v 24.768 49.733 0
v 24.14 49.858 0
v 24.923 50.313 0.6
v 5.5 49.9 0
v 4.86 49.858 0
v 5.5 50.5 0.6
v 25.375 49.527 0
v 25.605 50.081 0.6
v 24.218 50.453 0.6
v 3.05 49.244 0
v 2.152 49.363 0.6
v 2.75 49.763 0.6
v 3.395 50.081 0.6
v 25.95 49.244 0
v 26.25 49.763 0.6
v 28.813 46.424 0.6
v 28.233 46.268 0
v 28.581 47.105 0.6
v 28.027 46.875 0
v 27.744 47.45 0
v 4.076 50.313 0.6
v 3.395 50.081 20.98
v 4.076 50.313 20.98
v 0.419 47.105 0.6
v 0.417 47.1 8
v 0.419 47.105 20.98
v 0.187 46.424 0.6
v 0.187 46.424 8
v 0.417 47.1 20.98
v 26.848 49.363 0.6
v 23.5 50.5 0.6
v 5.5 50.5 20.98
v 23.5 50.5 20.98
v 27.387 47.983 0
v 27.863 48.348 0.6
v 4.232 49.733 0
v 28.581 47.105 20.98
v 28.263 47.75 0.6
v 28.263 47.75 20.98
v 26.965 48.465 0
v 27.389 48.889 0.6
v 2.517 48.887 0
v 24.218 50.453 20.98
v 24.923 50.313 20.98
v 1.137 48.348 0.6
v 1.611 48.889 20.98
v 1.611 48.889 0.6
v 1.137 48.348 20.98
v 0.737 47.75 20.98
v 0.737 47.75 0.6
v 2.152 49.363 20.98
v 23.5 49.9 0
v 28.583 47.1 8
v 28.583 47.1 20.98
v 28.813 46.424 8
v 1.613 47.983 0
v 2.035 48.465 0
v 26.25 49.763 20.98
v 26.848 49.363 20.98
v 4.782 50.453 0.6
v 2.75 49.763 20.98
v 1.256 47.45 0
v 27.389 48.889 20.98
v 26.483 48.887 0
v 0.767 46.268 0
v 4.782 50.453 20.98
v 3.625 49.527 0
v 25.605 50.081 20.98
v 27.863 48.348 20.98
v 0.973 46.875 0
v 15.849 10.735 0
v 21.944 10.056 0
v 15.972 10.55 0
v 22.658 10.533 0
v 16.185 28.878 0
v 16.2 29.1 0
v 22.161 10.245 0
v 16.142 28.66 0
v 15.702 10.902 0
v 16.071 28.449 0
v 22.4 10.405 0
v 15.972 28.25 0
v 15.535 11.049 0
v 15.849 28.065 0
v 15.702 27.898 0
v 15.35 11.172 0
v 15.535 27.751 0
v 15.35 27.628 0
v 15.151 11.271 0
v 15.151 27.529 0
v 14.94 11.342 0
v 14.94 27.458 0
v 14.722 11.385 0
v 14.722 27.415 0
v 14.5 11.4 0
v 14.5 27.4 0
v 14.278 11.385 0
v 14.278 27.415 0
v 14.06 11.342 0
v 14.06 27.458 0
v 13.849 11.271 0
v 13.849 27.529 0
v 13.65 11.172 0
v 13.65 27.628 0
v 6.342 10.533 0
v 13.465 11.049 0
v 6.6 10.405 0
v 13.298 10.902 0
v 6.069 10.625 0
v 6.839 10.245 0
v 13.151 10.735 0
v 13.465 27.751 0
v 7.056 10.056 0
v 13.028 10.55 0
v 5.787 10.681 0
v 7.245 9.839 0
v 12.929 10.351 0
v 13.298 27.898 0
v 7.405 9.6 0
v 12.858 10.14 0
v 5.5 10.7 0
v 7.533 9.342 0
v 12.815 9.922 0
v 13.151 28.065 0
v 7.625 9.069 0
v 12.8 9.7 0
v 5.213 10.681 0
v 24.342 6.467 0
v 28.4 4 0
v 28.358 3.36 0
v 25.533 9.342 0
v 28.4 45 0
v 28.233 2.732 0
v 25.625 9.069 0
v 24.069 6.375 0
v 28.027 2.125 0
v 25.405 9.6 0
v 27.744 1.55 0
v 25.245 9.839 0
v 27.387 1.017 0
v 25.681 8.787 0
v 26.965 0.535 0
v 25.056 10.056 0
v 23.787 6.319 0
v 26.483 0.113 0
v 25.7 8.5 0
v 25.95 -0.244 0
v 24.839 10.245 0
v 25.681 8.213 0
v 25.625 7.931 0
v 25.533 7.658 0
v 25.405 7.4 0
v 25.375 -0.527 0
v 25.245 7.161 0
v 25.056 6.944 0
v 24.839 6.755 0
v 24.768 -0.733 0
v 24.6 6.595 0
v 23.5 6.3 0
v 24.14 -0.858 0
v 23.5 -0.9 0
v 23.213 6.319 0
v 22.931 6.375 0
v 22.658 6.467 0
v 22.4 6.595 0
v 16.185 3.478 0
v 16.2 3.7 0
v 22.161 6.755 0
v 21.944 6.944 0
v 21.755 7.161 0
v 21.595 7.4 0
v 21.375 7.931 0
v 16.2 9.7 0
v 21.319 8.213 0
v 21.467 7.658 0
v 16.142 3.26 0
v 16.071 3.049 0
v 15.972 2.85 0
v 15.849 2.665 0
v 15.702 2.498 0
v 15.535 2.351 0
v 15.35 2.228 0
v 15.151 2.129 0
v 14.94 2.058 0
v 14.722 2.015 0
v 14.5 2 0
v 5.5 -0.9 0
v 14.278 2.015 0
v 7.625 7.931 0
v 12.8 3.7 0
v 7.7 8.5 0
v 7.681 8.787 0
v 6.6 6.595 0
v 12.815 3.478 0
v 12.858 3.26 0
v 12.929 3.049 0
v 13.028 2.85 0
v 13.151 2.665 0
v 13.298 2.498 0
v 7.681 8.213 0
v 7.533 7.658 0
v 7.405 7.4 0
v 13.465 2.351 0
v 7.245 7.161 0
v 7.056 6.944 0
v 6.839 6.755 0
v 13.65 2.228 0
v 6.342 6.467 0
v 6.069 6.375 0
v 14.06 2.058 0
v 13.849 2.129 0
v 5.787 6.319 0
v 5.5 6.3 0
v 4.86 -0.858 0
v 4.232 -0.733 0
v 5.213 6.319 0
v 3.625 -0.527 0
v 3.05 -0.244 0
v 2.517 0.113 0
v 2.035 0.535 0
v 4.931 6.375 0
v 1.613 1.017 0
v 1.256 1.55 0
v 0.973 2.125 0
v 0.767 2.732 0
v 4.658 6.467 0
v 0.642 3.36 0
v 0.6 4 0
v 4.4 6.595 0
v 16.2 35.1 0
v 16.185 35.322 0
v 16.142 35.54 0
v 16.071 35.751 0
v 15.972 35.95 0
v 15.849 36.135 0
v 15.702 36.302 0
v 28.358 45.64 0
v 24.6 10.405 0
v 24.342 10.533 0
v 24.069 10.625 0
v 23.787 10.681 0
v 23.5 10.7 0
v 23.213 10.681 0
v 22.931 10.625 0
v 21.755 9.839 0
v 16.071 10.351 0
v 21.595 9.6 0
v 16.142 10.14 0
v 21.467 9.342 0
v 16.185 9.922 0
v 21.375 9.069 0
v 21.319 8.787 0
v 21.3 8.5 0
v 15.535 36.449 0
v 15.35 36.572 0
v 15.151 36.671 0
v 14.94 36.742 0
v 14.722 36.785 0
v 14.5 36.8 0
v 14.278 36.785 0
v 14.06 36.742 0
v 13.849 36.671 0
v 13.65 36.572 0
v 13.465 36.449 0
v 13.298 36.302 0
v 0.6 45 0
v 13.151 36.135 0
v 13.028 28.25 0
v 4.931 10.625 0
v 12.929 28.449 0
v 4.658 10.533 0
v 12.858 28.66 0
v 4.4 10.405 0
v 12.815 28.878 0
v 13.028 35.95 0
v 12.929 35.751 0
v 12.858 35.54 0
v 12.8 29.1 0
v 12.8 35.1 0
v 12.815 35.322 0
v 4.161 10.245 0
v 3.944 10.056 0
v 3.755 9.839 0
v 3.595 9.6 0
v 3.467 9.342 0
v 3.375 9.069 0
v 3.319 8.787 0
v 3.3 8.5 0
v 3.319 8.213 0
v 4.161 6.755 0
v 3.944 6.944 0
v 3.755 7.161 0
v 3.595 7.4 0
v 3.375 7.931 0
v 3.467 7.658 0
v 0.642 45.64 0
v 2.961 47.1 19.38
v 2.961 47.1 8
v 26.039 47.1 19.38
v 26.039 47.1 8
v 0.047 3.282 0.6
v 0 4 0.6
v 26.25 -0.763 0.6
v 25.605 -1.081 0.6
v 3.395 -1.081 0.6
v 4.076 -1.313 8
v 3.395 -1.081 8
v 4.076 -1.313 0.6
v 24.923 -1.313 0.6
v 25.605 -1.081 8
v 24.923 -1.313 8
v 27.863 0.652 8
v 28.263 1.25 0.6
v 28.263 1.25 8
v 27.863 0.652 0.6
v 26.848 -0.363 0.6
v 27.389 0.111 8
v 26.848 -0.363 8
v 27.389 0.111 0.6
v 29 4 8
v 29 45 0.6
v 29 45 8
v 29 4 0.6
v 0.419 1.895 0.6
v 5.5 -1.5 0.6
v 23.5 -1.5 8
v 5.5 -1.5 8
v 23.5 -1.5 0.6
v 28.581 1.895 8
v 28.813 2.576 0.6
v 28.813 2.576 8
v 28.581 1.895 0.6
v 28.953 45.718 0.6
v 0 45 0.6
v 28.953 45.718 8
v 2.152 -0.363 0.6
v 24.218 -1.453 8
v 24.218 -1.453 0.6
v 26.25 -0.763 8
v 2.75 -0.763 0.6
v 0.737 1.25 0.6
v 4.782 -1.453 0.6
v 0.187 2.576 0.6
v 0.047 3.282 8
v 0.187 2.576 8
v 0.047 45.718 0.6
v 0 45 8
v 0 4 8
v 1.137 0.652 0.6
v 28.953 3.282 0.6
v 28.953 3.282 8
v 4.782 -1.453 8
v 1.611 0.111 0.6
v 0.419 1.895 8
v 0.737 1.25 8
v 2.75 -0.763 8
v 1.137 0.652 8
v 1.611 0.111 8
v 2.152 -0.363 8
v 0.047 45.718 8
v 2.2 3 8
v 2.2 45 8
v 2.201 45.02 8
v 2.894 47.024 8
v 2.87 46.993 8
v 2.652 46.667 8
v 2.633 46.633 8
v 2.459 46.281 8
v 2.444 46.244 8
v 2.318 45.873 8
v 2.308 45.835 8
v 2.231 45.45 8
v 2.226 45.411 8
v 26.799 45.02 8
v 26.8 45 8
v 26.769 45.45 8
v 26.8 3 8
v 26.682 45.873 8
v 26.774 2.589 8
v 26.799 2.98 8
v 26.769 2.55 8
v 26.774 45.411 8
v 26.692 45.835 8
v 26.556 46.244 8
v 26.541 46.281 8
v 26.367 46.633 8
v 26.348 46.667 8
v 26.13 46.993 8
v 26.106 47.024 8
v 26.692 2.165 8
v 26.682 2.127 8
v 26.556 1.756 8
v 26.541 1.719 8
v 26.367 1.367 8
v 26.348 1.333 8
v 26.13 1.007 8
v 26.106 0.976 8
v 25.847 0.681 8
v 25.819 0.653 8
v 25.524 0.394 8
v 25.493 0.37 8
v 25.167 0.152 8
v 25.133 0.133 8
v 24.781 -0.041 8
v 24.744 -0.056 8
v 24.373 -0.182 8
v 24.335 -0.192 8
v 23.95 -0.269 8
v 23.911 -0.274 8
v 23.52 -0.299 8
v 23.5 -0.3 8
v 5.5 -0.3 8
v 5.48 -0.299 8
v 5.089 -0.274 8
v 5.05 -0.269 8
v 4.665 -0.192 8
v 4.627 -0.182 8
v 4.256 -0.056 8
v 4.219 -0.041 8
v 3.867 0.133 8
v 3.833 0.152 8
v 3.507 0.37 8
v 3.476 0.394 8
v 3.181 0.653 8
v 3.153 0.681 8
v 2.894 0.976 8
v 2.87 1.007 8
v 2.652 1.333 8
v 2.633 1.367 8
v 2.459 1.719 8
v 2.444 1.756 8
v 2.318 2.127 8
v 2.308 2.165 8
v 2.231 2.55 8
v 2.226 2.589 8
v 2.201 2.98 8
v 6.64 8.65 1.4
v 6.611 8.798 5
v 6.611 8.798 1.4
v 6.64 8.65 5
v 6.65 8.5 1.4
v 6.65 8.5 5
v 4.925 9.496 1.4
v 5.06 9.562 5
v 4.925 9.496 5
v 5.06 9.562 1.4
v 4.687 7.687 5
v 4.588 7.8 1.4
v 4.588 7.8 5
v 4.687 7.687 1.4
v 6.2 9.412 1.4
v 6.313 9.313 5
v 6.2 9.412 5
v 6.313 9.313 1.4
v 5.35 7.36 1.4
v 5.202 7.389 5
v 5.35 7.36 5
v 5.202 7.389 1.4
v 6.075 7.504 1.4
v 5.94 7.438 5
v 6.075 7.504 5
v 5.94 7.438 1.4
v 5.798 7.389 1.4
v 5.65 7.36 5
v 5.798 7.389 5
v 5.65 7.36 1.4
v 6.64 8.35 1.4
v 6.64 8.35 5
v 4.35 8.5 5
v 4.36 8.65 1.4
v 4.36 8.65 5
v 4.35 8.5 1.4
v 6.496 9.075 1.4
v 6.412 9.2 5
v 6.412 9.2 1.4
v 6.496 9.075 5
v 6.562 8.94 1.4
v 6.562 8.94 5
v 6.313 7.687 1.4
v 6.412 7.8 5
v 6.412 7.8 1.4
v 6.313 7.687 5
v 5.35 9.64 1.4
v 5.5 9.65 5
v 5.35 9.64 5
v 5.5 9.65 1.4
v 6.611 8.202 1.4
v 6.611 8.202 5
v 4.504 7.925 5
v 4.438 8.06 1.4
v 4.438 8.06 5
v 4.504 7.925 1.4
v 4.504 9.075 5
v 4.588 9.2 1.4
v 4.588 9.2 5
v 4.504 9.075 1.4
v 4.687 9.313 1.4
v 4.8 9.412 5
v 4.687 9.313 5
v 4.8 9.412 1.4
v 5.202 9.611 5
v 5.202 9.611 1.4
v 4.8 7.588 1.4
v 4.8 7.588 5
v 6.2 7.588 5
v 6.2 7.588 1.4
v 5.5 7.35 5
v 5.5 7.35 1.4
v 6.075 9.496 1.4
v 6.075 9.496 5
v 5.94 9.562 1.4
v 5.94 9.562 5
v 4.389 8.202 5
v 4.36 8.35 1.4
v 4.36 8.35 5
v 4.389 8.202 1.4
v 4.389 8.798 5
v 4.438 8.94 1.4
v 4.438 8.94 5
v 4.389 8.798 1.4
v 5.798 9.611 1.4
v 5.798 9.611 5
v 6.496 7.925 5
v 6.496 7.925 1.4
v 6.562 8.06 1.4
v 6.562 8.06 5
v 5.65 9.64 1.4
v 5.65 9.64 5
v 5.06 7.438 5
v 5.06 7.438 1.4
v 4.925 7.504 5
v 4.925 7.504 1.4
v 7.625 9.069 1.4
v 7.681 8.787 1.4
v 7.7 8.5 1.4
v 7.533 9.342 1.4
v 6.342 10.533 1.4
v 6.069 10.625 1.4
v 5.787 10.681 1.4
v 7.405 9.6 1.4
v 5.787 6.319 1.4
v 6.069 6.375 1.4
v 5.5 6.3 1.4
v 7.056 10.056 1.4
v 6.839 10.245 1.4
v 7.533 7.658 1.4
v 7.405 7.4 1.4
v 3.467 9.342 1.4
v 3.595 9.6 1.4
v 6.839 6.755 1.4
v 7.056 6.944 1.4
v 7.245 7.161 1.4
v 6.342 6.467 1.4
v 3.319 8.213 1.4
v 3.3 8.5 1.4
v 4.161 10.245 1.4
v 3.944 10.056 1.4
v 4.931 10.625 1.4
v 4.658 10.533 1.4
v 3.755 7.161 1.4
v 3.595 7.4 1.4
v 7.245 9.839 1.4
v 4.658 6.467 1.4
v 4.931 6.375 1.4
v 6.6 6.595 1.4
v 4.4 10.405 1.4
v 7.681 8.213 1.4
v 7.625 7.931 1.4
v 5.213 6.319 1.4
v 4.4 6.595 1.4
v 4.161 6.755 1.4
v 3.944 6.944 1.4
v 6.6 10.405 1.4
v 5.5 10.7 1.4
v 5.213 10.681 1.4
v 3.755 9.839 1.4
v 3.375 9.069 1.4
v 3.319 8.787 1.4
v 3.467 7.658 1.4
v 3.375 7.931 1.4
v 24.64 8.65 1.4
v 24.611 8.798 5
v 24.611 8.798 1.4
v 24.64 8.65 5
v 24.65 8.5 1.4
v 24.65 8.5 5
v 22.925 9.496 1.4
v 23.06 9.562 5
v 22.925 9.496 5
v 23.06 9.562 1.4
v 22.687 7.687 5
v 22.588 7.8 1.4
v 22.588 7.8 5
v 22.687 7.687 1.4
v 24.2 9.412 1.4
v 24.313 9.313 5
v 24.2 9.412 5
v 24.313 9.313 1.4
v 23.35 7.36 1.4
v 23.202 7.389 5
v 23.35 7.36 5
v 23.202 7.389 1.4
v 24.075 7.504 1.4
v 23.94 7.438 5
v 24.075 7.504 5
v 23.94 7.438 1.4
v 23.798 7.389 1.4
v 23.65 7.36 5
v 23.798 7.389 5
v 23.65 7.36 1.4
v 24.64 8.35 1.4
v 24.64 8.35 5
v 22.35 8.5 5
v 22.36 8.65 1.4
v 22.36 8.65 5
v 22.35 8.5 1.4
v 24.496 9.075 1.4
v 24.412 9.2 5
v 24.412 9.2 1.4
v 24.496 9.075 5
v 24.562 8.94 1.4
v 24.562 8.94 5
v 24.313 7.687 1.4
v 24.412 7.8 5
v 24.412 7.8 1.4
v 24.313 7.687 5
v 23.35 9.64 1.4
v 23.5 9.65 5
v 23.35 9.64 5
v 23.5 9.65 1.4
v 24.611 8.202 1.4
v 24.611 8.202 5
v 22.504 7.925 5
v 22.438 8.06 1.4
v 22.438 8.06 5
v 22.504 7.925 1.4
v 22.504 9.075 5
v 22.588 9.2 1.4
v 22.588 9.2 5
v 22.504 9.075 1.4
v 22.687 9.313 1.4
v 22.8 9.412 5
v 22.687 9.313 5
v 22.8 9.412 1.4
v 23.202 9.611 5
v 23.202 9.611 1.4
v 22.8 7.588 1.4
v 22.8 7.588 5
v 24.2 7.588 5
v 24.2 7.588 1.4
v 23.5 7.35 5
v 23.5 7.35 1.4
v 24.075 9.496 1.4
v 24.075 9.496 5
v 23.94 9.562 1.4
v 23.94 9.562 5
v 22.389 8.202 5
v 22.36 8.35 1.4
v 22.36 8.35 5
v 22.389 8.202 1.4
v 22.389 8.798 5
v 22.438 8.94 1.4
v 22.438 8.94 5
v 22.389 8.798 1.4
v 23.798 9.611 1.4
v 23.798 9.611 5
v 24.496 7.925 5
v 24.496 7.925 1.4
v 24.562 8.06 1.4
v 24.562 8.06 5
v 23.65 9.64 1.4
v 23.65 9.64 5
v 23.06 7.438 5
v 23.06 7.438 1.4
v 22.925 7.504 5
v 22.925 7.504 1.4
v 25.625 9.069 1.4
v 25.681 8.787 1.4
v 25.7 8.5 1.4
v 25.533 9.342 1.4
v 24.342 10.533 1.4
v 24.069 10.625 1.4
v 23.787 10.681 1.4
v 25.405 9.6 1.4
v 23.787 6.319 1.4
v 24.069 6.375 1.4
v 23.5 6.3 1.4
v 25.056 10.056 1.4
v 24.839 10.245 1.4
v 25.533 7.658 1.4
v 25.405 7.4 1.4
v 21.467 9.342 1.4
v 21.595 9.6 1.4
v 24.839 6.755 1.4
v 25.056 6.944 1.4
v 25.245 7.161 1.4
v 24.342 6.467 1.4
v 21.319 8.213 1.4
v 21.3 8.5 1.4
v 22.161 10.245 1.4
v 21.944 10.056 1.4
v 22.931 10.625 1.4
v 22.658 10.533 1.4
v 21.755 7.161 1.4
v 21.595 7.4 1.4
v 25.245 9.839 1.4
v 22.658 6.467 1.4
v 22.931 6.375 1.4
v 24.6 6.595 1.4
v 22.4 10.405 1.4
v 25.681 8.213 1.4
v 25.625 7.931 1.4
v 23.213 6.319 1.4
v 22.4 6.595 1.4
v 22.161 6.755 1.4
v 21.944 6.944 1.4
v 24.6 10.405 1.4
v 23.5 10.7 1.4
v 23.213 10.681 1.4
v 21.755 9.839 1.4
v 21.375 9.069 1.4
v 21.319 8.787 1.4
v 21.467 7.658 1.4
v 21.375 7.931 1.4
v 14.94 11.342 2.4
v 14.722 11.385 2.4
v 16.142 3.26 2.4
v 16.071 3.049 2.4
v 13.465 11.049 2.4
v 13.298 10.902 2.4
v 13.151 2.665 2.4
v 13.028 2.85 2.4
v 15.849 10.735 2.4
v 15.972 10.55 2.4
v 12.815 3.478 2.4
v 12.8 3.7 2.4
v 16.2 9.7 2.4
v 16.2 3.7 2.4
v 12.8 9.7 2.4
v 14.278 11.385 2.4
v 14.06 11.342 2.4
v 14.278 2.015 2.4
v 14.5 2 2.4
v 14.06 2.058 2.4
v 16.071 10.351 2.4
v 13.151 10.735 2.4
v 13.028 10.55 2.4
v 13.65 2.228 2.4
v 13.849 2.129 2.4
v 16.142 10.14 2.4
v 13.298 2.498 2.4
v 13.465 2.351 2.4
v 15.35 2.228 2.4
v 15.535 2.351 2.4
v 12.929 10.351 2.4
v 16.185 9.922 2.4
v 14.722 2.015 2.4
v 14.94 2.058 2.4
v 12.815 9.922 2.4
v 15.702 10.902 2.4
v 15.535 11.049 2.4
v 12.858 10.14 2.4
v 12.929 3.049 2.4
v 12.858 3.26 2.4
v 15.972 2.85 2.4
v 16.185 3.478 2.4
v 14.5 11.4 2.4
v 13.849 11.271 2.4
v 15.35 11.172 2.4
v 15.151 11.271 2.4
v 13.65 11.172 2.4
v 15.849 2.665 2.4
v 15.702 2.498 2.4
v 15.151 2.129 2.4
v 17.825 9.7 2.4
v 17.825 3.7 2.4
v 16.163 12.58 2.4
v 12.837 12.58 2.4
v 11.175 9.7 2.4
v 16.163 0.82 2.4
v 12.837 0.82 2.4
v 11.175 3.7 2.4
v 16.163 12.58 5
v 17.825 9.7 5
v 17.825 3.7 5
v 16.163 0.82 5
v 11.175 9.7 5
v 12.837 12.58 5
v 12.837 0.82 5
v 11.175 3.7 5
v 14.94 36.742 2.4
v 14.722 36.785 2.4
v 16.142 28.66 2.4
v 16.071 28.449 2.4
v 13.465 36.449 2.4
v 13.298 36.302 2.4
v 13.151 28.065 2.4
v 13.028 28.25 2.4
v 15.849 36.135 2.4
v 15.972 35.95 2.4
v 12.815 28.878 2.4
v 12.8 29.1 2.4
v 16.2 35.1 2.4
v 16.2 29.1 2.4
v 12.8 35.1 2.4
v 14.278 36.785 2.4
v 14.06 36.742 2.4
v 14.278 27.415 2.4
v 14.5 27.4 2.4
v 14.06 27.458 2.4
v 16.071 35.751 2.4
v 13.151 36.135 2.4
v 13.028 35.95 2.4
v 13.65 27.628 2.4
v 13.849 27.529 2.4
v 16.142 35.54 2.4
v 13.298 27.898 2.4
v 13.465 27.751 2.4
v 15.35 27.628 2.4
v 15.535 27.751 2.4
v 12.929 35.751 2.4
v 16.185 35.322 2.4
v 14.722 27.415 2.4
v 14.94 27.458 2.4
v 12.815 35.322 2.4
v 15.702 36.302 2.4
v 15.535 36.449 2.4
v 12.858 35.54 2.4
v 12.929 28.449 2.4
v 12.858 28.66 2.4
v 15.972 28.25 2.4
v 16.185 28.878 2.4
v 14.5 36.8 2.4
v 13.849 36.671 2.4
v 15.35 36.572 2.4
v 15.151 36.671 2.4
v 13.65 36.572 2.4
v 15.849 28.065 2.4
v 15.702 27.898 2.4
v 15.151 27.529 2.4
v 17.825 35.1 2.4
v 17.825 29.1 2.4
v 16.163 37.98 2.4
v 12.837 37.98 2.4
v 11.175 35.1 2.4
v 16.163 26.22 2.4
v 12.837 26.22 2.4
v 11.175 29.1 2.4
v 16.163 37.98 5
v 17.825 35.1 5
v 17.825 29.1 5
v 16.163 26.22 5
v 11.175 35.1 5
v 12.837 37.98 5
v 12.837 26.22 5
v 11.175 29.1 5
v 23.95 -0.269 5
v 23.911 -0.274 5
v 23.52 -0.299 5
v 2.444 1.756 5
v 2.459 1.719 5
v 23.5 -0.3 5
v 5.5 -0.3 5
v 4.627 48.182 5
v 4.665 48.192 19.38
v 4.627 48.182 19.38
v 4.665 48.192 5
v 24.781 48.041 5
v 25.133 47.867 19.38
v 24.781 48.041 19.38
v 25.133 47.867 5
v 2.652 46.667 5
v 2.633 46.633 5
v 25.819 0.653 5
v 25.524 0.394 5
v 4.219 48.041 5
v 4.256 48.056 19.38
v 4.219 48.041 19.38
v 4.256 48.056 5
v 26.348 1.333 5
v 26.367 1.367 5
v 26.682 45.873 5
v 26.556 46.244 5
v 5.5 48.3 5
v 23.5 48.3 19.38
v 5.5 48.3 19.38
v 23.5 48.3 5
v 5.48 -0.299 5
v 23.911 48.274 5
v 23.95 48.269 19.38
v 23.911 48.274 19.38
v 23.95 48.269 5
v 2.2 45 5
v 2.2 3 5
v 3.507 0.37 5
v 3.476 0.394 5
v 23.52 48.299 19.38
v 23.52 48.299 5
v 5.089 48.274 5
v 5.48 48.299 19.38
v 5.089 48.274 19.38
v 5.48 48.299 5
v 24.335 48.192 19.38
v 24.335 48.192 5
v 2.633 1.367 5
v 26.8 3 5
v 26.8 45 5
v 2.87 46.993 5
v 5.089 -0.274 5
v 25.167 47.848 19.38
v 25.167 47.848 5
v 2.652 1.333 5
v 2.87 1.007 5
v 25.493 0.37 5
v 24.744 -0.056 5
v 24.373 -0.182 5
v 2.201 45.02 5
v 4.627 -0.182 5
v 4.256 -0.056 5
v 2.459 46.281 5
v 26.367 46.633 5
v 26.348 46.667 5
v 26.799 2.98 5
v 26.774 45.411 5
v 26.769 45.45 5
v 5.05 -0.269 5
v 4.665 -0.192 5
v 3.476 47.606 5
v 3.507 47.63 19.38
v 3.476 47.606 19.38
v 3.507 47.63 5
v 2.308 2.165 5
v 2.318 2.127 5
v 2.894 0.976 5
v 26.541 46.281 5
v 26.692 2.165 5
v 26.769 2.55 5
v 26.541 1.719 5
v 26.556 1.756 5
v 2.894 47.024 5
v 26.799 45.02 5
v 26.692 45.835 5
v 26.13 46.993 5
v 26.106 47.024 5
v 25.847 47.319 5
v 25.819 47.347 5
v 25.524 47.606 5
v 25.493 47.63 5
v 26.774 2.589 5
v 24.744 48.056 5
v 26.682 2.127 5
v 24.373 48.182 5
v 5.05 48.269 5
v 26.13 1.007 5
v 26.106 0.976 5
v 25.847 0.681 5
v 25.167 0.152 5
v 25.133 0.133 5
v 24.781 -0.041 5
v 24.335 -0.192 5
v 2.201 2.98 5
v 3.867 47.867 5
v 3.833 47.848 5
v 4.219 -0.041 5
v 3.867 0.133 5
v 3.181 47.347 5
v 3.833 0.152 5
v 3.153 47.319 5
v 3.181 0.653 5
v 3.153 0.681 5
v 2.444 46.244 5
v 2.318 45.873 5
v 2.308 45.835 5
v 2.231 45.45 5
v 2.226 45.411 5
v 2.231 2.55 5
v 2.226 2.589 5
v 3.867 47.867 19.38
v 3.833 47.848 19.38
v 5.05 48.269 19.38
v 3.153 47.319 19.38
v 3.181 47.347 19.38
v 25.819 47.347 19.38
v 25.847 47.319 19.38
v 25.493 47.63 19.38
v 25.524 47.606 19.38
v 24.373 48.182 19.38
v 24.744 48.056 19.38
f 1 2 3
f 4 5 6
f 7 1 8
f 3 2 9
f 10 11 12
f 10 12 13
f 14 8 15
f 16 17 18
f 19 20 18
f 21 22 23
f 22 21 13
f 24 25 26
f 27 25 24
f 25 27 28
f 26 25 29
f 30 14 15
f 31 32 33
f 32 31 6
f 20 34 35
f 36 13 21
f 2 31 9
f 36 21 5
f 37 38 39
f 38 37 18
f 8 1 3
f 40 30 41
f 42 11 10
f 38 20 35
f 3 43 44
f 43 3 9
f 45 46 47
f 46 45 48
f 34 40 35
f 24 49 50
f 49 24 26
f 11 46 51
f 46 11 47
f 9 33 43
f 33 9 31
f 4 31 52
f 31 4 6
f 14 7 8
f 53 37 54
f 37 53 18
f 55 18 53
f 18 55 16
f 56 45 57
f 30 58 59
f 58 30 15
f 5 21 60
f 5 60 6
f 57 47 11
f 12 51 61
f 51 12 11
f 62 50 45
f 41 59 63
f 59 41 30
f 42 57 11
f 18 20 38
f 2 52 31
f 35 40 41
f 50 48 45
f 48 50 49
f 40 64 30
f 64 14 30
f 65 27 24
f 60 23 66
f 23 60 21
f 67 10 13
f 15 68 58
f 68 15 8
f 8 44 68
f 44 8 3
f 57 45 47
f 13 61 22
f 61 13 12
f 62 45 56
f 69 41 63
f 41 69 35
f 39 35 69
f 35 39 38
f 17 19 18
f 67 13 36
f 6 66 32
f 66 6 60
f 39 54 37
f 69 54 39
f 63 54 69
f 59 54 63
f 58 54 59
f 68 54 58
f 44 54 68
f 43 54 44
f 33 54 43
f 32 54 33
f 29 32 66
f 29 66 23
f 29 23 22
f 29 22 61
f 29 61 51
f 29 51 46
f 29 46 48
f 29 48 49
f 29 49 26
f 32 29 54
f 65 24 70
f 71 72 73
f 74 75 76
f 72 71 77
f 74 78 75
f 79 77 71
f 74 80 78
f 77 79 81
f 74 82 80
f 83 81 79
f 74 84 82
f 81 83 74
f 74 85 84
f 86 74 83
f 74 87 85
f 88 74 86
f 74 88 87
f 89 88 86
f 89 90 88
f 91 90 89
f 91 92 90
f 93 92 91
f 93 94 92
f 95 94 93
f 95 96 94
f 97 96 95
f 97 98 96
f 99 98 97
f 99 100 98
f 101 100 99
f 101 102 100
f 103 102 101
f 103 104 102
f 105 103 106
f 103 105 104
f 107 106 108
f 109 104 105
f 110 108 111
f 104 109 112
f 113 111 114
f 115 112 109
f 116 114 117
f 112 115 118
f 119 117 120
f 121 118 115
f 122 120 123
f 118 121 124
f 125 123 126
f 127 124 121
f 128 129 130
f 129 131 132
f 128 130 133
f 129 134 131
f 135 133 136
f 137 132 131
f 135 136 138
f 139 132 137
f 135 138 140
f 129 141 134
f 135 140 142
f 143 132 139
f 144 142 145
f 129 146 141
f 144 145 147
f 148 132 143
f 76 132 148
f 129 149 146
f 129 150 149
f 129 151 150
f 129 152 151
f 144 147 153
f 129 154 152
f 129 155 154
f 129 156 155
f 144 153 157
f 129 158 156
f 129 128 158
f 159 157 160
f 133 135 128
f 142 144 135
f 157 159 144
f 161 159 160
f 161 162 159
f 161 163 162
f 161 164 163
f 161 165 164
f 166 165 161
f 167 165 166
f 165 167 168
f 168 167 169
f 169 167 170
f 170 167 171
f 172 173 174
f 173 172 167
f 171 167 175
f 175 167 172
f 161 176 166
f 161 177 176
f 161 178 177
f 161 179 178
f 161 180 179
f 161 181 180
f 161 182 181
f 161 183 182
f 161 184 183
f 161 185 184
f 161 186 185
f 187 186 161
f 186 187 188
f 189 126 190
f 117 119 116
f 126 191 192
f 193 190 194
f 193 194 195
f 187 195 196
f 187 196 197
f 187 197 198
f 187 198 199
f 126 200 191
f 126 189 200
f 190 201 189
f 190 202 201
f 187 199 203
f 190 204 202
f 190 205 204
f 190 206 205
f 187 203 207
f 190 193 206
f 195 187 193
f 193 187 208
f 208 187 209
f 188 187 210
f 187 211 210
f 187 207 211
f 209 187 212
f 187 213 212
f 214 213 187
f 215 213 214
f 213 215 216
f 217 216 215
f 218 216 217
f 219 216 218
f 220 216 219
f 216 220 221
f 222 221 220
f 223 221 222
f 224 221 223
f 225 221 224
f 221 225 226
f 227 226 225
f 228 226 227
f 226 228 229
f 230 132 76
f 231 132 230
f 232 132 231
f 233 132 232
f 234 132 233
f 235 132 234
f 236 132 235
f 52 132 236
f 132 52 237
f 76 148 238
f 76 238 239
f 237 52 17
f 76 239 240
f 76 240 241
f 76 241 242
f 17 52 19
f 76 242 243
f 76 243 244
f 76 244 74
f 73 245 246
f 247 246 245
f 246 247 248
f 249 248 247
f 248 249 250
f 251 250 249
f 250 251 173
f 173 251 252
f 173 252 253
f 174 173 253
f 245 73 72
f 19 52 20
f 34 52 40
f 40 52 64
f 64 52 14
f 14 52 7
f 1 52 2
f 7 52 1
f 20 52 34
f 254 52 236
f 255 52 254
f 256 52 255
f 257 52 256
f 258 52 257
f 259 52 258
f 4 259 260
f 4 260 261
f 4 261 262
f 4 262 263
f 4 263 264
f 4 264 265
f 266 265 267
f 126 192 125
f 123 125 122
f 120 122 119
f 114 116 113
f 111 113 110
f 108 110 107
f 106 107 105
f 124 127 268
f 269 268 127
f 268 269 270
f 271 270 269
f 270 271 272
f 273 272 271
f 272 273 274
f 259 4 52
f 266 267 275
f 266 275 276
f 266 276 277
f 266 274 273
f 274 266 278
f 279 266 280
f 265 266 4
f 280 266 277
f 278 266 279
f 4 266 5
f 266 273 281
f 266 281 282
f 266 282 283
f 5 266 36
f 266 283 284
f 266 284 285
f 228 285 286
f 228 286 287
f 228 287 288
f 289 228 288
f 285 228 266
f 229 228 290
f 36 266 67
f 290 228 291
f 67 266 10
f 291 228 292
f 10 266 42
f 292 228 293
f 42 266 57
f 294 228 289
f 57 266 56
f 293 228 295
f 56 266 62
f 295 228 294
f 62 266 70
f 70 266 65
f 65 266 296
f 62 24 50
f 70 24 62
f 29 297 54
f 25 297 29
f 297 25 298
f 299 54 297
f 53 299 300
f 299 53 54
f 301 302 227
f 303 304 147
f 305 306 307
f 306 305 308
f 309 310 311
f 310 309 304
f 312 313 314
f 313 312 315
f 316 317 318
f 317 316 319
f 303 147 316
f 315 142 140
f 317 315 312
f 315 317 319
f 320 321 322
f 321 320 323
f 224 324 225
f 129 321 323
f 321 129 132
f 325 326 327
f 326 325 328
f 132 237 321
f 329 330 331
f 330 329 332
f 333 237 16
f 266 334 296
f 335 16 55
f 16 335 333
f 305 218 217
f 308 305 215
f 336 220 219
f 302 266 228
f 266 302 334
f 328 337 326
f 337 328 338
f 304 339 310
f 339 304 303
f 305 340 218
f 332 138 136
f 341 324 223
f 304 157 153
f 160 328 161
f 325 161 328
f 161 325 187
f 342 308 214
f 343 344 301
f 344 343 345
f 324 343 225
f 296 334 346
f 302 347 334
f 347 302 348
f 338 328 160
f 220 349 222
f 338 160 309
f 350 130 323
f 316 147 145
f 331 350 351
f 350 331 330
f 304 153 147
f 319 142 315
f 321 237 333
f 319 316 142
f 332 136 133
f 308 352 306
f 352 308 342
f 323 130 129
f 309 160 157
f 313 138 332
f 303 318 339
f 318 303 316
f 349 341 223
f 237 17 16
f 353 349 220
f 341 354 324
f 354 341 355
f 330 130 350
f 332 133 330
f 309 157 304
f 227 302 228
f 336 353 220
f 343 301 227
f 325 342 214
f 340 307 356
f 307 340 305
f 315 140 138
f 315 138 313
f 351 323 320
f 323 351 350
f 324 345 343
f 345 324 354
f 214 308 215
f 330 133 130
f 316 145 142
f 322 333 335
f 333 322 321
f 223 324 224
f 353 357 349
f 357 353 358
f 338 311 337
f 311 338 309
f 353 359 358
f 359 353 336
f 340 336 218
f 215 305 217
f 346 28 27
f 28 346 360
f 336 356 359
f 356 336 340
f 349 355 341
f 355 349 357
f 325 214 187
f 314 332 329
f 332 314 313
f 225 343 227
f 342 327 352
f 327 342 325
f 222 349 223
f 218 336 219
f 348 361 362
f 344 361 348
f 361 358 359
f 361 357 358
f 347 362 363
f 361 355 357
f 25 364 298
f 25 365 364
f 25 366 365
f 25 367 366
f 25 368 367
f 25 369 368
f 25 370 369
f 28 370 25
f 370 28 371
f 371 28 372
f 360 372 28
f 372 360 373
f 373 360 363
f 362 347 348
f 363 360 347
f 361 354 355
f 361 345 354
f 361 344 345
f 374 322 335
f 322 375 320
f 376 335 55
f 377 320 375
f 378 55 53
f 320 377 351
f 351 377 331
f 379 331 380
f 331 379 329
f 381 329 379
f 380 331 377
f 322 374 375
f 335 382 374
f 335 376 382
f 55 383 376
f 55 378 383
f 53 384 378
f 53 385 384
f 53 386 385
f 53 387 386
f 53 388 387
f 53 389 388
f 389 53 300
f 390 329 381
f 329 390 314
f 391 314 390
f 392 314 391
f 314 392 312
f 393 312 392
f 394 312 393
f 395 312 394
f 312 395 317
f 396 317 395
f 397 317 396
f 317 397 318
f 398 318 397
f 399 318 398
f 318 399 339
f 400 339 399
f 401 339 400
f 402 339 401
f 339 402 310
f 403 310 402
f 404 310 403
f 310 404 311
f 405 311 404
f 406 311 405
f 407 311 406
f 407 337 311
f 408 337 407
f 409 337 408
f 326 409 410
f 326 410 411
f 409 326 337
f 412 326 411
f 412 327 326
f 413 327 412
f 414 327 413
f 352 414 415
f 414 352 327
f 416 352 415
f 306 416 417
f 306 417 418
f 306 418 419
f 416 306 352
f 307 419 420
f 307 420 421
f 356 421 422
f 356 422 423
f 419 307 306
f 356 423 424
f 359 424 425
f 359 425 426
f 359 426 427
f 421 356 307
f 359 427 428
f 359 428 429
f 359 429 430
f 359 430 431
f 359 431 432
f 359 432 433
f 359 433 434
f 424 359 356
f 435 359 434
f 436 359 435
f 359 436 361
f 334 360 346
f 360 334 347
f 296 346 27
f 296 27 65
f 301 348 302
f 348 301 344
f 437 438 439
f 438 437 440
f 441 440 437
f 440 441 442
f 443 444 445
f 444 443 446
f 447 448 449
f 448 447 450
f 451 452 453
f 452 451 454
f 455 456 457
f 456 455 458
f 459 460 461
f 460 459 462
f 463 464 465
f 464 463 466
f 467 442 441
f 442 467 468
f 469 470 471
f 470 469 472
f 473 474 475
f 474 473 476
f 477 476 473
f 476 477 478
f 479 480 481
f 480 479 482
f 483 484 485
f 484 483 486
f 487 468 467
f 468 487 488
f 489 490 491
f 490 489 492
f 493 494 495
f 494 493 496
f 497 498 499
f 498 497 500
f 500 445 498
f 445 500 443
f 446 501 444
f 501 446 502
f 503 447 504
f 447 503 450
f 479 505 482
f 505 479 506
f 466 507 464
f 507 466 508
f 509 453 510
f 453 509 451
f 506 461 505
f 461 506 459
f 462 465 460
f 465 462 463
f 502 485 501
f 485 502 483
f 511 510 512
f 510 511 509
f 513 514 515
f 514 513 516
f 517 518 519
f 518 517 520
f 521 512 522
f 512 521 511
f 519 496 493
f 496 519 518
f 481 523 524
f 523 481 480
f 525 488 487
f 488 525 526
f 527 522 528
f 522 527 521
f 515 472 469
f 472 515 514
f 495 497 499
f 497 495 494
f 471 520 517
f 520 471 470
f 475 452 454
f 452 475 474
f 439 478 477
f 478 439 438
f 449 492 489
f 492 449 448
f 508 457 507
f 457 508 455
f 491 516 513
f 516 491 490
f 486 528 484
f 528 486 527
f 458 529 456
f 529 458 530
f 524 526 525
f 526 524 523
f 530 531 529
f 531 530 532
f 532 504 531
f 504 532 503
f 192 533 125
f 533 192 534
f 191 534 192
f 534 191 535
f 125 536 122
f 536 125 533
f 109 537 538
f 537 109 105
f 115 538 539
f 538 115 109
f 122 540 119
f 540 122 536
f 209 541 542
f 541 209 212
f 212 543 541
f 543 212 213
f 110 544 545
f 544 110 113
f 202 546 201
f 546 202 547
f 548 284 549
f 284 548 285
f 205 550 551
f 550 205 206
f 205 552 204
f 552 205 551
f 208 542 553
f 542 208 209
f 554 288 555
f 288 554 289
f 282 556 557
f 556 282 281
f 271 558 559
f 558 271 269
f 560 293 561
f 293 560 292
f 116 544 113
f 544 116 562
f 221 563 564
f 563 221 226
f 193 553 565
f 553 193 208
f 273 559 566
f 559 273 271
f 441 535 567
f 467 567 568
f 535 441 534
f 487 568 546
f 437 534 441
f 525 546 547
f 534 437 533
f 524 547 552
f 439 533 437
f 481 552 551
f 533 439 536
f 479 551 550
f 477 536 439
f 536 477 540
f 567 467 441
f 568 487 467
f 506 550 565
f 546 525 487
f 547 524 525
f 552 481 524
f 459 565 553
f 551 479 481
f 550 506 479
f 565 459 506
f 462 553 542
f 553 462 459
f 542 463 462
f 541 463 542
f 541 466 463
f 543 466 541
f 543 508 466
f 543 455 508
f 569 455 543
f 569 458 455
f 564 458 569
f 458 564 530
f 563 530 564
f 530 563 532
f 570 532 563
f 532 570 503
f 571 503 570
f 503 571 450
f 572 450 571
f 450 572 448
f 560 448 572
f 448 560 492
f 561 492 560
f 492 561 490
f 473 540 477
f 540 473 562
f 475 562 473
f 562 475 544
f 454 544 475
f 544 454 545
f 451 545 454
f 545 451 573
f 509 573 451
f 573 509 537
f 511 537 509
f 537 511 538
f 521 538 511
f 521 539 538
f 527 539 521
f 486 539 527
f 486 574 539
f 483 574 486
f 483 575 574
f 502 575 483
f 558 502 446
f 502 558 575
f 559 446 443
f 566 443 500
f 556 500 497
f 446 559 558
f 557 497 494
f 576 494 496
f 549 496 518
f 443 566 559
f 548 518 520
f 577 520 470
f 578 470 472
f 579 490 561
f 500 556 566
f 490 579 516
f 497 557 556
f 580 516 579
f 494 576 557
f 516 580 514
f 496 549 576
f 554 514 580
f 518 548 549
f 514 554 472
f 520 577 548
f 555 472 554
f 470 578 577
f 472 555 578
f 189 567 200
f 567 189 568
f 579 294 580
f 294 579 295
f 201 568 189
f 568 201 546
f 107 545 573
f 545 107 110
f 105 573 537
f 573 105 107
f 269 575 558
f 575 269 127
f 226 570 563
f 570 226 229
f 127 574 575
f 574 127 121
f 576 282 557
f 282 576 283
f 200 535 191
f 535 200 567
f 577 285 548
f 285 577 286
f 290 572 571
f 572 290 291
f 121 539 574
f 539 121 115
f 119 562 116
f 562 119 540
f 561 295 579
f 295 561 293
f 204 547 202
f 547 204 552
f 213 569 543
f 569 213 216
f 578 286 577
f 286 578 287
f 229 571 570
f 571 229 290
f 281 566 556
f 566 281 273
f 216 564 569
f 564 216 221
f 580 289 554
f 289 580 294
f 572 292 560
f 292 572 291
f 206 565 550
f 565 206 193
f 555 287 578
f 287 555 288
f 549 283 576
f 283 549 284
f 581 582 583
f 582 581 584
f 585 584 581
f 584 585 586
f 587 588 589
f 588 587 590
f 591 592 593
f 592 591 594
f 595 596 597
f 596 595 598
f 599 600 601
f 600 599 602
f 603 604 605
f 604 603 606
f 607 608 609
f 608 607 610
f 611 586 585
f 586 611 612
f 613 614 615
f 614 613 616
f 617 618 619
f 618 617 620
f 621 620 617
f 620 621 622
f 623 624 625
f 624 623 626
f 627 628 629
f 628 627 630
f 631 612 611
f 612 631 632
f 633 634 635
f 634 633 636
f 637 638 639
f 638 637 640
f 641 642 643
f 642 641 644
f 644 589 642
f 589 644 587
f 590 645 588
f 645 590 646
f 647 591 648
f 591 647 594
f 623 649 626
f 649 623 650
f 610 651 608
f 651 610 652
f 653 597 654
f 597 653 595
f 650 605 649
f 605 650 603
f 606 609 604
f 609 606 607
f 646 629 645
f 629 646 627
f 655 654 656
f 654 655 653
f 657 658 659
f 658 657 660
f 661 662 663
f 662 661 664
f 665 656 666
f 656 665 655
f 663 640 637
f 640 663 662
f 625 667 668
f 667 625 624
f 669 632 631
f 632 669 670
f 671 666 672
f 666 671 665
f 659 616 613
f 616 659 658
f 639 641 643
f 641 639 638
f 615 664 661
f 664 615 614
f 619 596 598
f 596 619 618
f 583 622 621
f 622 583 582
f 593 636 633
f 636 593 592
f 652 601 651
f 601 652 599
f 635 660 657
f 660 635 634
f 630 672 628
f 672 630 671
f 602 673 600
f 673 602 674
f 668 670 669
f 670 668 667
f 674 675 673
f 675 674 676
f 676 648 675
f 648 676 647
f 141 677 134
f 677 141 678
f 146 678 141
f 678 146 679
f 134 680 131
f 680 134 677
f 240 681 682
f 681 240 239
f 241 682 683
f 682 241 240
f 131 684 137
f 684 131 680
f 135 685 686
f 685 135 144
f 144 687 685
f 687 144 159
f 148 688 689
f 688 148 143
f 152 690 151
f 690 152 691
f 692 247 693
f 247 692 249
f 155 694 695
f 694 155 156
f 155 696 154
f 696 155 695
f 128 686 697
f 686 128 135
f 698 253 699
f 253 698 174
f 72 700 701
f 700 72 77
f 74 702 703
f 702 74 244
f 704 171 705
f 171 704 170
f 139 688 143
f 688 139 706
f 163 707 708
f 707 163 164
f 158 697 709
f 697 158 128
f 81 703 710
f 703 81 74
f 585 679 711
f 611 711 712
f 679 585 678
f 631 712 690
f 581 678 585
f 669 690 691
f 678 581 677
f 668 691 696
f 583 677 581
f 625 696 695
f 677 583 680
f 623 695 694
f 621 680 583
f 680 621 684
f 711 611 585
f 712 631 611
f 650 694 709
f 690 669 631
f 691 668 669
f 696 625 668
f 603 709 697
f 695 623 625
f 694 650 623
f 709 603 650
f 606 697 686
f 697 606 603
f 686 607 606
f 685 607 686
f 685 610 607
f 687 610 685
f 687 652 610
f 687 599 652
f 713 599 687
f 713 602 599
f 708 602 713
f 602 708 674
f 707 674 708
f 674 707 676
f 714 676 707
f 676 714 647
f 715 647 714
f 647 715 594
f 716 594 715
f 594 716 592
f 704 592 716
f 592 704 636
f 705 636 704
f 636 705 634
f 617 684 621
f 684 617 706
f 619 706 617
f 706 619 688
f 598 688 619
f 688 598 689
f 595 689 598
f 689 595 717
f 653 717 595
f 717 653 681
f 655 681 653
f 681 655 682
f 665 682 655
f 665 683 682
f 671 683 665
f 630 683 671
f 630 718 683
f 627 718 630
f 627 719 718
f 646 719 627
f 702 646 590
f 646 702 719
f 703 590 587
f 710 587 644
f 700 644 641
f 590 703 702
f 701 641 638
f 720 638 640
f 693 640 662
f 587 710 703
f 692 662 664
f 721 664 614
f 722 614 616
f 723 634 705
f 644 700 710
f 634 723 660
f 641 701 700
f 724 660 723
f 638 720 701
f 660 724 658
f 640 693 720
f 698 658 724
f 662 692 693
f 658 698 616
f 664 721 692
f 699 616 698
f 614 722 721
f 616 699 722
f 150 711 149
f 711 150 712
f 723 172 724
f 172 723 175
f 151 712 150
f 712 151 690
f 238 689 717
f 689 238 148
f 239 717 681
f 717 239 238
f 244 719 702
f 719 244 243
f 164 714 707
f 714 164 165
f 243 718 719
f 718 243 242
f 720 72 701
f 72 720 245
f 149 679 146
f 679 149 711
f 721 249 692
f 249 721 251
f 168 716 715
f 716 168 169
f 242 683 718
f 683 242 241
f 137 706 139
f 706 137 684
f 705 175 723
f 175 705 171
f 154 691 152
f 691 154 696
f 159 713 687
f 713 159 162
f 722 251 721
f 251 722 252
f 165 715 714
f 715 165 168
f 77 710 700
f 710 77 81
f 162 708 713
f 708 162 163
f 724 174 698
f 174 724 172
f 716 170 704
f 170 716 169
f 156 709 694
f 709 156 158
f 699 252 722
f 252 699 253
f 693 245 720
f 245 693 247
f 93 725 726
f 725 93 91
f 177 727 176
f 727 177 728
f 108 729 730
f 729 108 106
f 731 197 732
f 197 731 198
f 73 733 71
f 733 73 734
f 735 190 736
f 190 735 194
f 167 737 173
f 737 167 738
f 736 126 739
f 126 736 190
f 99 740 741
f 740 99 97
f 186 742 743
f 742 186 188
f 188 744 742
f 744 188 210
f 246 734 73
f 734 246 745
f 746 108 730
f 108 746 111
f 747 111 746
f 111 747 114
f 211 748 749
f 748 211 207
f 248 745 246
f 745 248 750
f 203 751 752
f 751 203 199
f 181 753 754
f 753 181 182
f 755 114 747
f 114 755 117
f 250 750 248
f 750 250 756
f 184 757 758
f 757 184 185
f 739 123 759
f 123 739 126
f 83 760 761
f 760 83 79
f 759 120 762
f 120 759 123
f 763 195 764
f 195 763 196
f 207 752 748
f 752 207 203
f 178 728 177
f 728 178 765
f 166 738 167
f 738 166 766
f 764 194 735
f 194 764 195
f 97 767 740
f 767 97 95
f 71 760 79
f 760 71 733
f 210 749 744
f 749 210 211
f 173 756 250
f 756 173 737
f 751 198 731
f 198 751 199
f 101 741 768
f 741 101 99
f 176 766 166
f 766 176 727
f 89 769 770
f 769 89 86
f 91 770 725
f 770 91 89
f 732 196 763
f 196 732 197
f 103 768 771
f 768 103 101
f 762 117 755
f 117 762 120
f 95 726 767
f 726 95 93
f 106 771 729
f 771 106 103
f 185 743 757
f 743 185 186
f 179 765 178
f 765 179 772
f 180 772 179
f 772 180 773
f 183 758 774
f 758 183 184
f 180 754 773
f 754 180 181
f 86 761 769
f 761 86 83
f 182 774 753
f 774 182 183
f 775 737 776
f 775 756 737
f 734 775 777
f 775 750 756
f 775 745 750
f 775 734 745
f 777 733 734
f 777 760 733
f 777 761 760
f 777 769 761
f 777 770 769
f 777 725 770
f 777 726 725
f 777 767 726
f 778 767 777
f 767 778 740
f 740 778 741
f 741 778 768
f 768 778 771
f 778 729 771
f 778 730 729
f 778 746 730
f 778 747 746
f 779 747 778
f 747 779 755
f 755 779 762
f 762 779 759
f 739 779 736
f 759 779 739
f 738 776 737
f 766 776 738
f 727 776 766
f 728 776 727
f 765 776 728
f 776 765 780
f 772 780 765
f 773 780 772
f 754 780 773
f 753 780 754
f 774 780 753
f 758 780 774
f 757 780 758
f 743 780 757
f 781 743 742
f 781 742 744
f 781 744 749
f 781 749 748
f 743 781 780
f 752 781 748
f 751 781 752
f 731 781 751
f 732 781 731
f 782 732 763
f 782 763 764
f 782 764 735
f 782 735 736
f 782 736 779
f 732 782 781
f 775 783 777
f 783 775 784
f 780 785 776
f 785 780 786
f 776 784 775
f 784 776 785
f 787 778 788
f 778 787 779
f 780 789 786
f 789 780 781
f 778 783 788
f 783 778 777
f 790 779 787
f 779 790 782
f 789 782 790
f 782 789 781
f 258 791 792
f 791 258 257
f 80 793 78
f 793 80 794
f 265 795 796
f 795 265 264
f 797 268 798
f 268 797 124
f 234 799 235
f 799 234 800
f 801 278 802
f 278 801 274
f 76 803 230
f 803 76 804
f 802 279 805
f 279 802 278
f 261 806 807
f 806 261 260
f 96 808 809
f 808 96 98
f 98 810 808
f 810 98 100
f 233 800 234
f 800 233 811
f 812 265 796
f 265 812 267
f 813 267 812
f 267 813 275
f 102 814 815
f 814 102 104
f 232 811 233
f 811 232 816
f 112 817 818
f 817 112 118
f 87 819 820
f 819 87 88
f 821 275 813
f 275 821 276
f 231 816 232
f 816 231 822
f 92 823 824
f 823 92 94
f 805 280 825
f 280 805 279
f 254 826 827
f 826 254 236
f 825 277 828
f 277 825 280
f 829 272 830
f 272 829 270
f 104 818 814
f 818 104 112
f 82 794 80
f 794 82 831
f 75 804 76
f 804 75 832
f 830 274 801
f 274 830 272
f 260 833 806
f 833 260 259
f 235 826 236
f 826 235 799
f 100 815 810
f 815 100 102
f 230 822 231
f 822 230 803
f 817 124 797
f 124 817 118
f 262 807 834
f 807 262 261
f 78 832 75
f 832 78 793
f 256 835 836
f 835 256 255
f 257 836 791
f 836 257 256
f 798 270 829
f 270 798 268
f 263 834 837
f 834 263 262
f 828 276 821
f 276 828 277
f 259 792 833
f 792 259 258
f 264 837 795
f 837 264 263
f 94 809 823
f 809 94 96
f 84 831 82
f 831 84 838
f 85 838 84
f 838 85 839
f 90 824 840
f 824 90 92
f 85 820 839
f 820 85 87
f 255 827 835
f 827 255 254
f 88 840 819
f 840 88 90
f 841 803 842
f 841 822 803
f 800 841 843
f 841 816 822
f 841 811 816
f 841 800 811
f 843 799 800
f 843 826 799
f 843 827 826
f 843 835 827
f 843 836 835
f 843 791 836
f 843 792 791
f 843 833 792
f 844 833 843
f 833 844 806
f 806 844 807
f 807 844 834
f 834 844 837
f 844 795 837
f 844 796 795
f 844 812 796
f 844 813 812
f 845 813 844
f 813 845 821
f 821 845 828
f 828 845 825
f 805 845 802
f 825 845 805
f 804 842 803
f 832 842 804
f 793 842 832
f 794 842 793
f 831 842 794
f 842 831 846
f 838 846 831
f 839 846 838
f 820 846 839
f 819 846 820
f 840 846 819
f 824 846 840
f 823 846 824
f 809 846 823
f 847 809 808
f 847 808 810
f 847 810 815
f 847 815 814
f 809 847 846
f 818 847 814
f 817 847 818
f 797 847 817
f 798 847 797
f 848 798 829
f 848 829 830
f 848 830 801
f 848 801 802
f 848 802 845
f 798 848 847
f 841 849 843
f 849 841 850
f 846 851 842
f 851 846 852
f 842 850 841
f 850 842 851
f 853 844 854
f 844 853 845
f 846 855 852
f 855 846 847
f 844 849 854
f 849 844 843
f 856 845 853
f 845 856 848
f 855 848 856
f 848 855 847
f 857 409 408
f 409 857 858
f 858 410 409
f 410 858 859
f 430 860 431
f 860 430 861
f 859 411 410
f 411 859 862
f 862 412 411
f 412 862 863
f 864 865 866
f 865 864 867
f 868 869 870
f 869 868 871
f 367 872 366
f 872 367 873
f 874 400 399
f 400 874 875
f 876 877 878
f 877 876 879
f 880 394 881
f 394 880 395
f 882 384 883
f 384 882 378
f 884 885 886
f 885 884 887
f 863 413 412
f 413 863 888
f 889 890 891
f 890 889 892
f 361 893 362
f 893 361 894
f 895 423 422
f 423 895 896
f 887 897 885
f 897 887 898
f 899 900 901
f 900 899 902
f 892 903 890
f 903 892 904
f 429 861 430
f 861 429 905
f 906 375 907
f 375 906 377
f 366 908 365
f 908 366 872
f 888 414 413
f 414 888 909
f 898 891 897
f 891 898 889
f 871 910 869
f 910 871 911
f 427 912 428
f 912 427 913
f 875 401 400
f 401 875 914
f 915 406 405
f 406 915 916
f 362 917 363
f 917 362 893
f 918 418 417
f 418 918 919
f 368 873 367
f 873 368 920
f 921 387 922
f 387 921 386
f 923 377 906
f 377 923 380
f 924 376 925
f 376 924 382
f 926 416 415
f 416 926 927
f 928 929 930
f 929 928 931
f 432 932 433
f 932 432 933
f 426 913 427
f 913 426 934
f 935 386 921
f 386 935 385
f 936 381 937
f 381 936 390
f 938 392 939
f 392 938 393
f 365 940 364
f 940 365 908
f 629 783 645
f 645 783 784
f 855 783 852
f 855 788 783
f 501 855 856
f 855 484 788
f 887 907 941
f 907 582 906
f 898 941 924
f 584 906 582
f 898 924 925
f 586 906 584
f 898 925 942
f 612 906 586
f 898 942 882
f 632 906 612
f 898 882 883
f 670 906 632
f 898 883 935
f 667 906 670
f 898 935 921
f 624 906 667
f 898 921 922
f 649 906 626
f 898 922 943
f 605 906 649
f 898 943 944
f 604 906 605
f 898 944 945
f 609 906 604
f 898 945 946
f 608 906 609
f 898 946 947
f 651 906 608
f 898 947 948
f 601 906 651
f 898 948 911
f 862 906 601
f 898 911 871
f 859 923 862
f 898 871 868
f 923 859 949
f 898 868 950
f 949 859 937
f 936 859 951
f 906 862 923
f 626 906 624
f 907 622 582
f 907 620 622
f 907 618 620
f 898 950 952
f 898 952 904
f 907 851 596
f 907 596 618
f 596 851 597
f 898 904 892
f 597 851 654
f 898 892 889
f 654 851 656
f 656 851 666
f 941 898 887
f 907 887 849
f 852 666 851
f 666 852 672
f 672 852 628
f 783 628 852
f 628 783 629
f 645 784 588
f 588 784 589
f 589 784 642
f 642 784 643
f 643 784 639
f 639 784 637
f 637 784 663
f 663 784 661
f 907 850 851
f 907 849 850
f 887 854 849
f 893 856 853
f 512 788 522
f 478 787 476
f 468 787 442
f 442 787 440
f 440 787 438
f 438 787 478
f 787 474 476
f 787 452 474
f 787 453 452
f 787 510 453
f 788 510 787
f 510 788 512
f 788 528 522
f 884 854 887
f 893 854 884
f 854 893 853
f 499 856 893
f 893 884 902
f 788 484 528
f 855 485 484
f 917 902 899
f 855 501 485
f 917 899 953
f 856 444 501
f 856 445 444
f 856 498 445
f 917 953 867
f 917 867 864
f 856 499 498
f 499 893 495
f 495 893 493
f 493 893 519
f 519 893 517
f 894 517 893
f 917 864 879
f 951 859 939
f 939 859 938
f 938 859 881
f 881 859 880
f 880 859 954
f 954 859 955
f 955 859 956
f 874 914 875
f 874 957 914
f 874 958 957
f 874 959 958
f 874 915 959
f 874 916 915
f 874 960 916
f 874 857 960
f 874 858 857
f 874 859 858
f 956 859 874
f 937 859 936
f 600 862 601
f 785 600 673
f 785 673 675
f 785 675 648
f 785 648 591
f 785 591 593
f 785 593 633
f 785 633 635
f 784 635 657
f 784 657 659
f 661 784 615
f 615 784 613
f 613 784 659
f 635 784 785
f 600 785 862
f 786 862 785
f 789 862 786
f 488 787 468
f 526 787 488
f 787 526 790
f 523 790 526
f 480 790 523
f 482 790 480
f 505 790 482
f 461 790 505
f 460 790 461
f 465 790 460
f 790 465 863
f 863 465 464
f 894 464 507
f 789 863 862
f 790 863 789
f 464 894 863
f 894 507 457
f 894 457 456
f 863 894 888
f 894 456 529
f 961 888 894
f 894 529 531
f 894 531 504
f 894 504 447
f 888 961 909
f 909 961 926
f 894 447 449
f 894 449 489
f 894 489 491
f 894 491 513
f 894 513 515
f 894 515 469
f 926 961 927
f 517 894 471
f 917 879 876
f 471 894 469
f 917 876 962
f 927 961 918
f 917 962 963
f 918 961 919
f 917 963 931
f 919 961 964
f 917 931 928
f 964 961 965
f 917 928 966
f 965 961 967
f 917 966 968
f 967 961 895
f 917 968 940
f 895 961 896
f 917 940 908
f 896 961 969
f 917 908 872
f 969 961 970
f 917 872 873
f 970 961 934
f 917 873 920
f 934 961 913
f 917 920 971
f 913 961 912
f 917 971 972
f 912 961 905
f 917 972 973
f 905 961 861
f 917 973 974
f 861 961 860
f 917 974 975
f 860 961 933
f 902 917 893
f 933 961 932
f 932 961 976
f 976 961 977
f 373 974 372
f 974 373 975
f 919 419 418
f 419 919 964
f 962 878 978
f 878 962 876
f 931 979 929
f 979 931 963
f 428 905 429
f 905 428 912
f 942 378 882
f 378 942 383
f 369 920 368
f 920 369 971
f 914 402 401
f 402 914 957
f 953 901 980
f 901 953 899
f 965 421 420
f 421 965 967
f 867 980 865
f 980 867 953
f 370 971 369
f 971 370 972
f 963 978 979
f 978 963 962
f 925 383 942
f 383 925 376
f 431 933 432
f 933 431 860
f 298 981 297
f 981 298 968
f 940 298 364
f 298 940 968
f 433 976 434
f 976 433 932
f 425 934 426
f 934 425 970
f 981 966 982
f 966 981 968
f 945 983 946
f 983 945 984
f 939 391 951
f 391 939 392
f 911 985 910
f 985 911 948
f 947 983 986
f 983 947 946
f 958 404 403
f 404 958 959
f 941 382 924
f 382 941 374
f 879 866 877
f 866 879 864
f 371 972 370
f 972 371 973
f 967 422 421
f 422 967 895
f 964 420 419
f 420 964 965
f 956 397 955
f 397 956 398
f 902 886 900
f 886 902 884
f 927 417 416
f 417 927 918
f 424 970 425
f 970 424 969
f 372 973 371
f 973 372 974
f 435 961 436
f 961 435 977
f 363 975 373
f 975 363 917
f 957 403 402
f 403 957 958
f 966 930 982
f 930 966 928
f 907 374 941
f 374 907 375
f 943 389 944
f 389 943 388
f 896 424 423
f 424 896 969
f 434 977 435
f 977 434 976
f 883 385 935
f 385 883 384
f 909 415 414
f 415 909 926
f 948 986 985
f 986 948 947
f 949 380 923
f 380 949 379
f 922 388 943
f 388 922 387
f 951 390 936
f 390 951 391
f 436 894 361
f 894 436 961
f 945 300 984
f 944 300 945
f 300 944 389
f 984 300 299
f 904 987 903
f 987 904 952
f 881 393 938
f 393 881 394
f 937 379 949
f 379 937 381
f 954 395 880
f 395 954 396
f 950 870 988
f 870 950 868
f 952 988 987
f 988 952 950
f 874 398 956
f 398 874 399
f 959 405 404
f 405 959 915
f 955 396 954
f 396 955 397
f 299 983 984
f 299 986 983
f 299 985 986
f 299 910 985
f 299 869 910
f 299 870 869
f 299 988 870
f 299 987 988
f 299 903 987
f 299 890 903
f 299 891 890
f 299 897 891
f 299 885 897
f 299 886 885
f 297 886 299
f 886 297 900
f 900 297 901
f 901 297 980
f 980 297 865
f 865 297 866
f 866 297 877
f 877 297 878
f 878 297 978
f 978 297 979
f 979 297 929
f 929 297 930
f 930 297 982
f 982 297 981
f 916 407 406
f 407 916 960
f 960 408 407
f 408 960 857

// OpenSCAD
// M5Stack StickS3 (K150) clip mount: a printed cradle bolted to a tempered
// spring-steel belt clip. Clips to a shirt, pocket, waistband or watch band.
//
// Clips (theclip.com, both US-made tempered spring steel):
//   "631"  MCS-631SS, 2.72" x 1" stainless: sweat-proof, overhangs the top end by ~14 mm
//   "661"  MCS-661, 2.15" x 1" powder-coated/nickel spring steel: same length as the Stick
//
// Assembly:
//   1. Drop 2 M3 nuts into the hex pockets inside the cradle.
//   2. Tilt the Stick's USB-C end up, slide its top end under the lip, lower it, and
//      screw it down from underneath with 2x M2x6 socket-cap or button-head screws
//      (they sit in counterbores, flush with the bottom). No longer than 6 mm: the
//      Stick's threaded bosses are only ~3 mm deep with electronics right behind them.
//   3. Bolt the clip on with 2x M3x4 or M3x5 socket-cap / button-head screws through
//      the clip's own holes. With M3x6, add a washer under each head; nothing may
//      stick out past the nut or it will press on the Stick.
// USB-C stays open, so it charges on the clip.
//
// Print: PETG, flat side down, no supports. 0.2 mm layers, 5 walls, 100% infill.

/* [Clip] */
clip_model = "631"; // [631, 661]

/* [Fit tuning] */
// Gap around the Stick, per side. 0.2 if it rattles, 0.4 if it won't go in.
clearance = 0.3;

/* [Hidden] */
$fn = 48;
eps = 0.01;

// ---- StickS3 (from M5Stack's K150 drawing + official STL) -----------------
STICK_W = 24;
STICK_L = 48;
STICK_T = 14.08;
STICK_R = 3;
SCREW_POS = [[3, 8.5], [21, 8.5]];    // M2 threaded holes, from the Stick's left edge / USB-C end
SIDE_BUTTON_Z = 3.6;                  // side buttons start this far above the Stick's back

// ---- Cradle ---------------------------------------------------------------
wall = 2.2;
floor_t = 5.0;          // holds M3 nuts, and M2x6 cap screws engage 2.4 mm
rail_h = 3.0;
usb_curb = 1.2;
lip_overhang = 1.2;
lip_t = 1.6;
bottom_chamfer = 0.6;

W = STICK_W + 2 * (wall + clearance);
X0 = wall + clearance;
Y0 = -clearance - usb_curb;
Y_WALL = STICK_L + clearance;
Y1 = Y_WALL + wall;
LIP_Z = floor_t + STICK_T + clearance;
TOP_Z = LIP_Z + lip_t;
R_OUT = STICK_R + clearance + wall;

// ---- Clip hardware ----------------------------------------------------------
// Hole positions along the cradle (y). Hole spacing is dimensioned on theclip.com's
// drawings (1.000" and 0.50"); where the pair sits along the clip is scaled off the
// drawing, so the slots let the clip slide +/-3 mm to wherever its holes really are.
CLIP_631 = [Y0 + 3 + 5.2, Y0 + 3 + 5.2 + 25.4];   // open end ~3 mm past the USB-C end, bend at the top
CLIP_661 = [Y1 - 11.4, Y1 - 11.4 - 12.7];         // bend end at the top end
CLIP_HOLES_Y = clip_model == "661" ? CLIP_661 : CLIP_631;
slot = 6;
m3_clear = 3.4;
m3_nut_af = 5.5;
nut_h = 2.4;
nut_pocket = nut_h + 0.2;

assert(rail_h < SIDE_BUTTON_Z - 0.5, "rails would cover the side buttons");
assert(floor_t - nut_pocket >= 1.2, "floor too thin under the nuts");
assert(6 - (floor_t - m2_head_pocket) <= 2.6, "M2x6 would bottom out in the Stick's boss");
for (y = CLIP_HOLES_Y) assert(y - slot / 2 - m3_nut_af / cos(30) / 2 > Y0 + 1.2 && y + slot / 2 < Y1 - 3,
                              "clip slot falls outside the cradle");

module rrect(x0, y0, x1, y1, r) {
    translate([x0 + r, y0 + r]) offset(r = r) square([x1 - x0 - 2 * r, y1 - y0 - 2 * r]);
}

module chamfered_slab(x0, y0, x1, y1, r, z0, z1, c) {
    hull() {
        translate([0, 0, z0]) linear_extrude(eps) rrect(x0 + c, y0 + c, x1 - c, y1 - c, max(r - c, 0.5));
        translate([0, 0, z0 + c]) linear_extrude(z1 - z0 - c) rrect(x0, y0, x1, y1, r);
    }
}

module stick_pocket_2d() {
    offset(r = clearance) rrect(X0, 0, X0 + STICK_W, STICK_L, STICK_R);
}

// counterbore for an M2 socket-cap or button head (head sits flush with the bottom)
m2_head_d = 4.4;
m2_head_pocket = 1.4;
module counterbored_m2() {
    translate([0, 0, -1]) cylinder(d = 2.3, h = floor_t + 2);
    translate([0, 0, -1]) cylinder(d = m2_head_d, h = 1 + m2_head_pocket);
}

module stadium(d, len, h) {
    hull() for (dy = [-len / 2, len / 2]) translate([0, dy, 0]) cylinder(d = d, h = h);
}

// the nut pocket opens into the Stick pocket so nuts drop in from above; a seated
// nut's top is 0.2 mm below the floor, under the Stick
module m3_nut_slot() {
    translate([0, 0, -1]) stadium(m3_clear, slot, floor_t + 2);
    translate([0, 0, floor_t - nut_pocket]) hull() for (dy = [-slot / 2, slot / 2])
        translate([0, dy, 0]) cylinder(d = m3_nut_af / cos(30) + 0.3, h = nut_pocket + 1, $fn = 6);
}

module clip_mount() {
    difference() {
        union() {
            chamfered_slab(0, Y0, W, Y1, R_OUT, 0, floor_t + rail_h, bottom_chamfer);
            intersection() {
                chamfered_slab(0, Y0, W, Y1, R_OUT, 0, TOP_Z, bottom_chamfer);
                translate([-1, Y_WALL - lip_overhang, -1]) cube([W + 2, Y1 - Y_WALL + lip_overhang + 1, TOP_Z + 2]);
            }
        }
        translate([0, 0, floor_t]) linear_extrude(LIP_Z - floor_t) stick_pocket_2d();
        for (p = SCREW_POS) translate([X0 + p[0], p[1], 0]) counterbored_m2();
        for (y = CLIP_HOLES_Y) translate([W / 2, y, 0]) m3_nut_slot();
    }
}

clip_mount();
